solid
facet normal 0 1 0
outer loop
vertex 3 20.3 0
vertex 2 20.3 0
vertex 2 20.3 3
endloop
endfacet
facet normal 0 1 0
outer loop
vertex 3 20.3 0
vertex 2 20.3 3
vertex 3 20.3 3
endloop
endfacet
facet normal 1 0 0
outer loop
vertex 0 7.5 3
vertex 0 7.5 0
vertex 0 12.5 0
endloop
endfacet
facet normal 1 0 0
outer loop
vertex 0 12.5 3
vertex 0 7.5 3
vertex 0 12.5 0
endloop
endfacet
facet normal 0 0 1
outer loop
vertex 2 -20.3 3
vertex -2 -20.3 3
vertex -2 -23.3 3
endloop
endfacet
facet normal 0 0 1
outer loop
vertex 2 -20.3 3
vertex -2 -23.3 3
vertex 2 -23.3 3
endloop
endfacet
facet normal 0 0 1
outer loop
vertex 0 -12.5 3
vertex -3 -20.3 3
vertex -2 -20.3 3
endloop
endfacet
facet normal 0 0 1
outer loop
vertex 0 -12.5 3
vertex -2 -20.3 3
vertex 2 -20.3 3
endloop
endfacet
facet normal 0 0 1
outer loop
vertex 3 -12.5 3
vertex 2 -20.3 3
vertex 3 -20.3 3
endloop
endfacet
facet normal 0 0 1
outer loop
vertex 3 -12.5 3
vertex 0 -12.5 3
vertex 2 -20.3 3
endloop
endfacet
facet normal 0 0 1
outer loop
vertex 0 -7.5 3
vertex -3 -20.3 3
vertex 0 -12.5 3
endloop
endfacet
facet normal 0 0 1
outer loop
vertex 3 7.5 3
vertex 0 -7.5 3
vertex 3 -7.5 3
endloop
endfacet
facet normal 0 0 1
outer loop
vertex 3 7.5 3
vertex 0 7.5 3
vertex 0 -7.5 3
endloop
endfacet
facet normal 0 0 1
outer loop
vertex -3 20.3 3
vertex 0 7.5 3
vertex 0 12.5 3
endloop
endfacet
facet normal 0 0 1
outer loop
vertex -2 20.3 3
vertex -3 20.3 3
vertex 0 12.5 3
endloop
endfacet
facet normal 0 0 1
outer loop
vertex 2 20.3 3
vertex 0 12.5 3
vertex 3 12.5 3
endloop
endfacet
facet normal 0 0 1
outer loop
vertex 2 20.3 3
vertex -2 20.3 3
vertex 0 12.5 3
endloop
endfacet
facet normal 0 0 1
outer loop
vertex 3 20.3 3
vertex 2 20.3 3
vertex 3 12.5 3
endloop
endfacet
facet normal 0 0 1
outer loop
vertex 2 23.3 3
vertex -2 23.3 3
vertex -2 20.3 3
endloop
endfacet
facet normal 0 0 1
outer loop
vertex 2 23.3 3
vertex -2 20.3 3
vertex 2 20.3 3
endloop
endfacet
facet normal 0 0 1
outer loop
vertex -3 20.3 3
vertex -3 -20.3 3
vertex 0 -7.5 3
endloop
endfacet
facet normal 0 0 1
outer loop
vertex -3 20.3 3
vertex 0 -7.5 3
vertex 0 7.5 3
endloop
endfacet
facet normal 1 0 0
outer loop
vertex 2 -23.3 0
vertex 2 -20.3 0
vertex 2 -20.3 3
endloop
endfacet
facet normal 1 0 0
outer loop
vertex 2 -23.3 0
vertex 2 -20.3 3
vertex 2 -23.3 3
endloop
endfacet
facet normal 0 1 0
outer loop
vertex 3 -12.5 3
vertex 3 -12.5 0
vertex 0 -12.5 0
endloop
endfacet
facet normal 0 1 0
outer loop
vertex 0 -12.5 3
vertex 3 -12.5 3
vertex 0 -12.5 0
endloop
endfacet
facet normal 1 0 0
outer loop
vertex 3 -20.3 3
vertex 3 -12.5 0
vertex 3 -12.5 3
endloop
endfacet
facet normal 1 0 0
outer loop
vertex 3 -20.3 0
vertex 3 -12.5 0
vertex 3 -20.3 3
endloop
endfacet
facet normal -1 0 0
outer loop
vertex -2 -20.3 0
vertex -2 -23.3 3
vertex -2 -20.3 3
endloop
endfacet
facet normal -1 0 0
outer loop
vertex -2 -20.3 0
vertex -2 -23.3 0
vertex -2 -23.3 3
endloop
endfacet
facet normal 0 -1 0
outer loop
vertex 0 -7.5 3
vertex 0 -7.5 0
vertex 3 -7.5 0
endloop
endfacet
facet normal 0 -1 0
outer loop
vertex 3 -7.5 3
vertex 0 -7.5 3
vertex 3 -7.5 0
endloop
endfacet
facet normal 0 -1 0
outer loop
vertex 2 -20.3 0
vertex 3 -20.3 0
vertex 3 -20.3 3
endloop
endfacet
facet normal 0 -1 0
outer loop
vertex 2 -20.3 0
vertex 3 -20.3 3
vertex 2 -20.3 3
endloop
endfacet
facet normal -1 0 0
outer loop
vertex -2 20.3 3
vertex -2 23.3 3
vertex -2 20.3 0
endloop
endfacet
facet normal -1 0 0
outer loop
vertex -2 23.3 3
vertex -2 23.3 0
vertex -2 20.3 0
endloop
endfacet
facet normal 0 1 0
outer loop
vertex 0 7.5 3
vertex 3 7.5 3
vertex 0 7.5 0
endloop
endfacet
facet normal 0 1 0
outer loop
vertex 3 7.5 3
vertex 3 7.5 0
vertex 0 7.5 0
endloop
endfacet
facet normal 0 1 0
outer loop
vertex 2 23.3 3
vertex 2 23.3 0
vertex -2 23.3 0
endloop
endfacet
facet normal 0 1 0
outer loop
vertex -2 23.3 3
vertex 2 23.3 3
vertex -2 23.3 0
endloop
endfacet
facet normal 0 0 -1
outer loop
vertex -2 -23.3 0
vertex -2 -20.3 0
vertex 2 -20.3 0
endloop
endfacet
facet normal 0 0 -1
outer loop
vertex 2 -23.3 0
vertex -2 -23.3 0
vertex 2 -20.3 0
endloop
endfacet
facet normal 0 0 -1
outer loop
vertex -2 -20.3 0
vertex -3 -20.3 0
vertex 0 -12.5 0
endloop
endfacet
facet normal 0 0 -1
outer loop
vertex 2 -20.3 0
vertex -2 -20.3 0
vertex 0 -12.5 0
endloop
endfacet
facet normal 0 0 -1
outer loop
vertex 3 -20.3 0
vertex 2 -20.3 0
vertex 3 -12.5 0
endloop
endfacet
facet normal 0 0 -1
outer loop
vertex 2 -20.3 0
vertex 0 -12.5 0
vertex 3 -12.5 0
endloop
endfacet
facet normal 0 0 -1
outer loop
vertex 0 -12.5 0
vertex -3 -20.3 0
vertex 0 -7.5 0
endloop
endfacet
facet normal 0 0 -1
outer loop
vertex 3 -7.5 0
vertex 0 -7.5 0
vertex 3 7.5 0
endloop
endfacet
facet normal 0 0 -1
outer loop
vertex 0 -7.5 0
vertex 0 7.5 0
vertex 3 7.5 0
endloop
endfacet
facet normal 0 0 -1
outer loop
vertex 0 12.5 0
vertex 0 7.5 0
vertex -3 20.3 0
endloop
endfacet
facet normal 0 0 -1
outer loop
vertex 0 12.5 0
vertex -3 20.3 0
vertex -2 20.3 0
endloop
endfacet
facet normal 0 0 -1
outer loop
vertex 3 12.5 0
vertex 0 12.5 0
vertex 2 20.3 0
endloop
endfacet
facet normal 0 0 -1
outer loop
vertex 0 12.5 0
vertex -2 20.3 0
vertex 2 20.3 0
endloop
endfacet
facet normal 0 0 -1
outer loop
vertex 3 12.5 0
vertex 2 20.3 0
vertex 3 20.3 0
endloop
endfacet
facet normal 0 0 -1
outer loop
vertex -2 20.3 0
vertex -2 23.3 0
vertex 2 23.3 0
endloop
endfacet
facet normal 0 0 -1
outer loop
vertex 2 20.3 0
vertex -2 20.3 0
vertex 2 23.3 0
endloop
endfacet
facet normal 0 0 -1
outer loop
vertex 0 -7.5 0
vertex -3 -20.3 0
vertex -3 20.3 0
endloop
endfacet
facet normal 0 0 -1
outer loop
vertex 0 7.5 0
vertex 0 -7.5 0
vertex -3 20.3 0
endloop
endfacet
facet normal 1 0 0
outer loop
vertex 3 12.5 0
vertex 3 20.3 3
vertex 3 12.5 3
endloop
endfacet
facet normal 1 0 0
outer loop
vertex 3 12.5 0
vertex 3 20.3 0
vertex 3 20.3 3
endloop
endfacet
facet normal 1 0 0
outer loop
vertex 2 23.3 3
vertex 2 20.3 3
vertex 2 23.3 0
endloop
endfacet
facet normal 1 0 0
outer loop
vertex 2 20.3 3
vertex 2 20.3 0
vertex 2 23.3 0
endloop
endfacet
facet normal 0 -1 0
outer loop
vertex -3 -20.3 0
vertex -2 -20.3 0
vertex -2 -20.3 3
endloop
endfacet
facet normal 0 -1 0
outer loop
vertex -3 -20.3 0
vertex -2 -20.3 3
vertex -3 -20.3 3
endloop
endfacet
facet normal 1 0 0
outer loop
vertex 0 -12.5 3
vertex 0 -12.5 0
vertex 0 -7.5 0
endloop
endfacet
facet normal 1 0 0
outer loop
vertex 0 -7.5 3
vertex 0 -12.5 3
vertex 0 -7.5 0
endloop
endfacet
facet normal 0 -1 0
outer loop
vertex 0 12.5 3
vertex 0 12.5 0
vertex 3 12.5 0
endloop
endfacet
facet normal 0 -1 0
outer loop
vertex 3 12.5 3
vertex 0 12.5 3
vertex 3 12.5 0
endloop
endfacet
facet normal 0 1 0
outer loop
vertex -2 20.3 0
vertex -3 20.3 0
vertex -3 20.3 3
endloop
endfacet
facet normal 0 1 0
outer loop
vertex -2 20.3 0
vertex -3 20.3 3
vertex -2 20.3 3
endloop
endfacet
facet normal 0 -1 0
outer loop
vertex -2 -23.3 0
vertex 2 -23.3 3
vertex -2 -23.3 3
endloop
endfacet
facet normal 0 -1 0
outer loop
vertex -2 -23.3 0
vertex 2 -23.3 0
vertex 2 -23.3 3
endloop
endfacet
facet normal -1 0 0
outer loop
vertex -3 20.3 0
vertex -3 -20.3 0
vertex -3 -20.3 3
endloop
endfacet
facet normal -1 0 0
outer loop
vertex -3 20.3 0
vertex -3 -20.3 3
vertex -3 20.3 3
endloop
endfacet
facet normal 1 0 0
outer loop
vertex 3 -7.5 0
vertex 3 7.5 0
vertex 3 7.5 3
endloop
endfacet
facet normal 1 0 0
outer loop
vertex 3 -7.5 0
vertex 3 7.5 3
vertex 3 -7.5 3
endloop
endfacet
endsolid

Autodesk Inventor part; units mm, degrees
ref_plane "YZ Plane" through (0, 0, 0) normal (1, 0, 0) x (0, 1, 0)
ref_plane "XZ Plane" through (0, 0, 0) normal (0, 1, 0) x (-1, 0, 0)
ref_plane "XY Plane" through (0, 0, 0) normal (0, 0, 1) x (1, 0, 0)
sketch "Sketch1" plane through (0, 0, 0) normal (0, 0, 1) x (1, 0, 0)
  line L0 (-3, 20.3) -> (3, 20.3)
  line L1 (3, 20.3) -> (3, -20.3)
  line L2 (3, -20.3) -> (-3, -20.3)
  line L3 (-3, -20.3) -> (-3, 20.3)
  line L4 (-2, -20.3) -> (2, -20.3)
  line L5 (2, -20.3) -> (2, -23.3)
  line L6 (2, -23.3) -> (-2, -23.3)
  line L7 (-2, -23.3) -> (-2, -20.3)
  line L8 (-2, 20.3) -> (2, 20.3)
  line L9 (2, 20.3) -> (2, 23.3)
  line L10 (2, 23.3) -> (-2, 23.3)
  line L11 (-2, 23.3) -> (-2, 20.3)
  line L12 (3, -12.5) -> (0, -12.5)
  line L13 (0, -12.5) -> (0, -7.5)
  line L14 (0, -7.5) -> (3, -7.5)
  line L15 (3, -7.5) -> (3, -12.5)
  line L16 (3, 7.5) -> (0, 7.5)
  line L17 (0, 7.5) -> (0, 12.5)
  line L18 (0, 12.5) -> (3, 12.5)
  line L19 (3, 12.5) -> (3, 7.5)
  point P0 (0, 0)
  point P1 (0, 23.3)
  point P2 (0, 20.3)
  point P3 (0, 20.3)
  point P4 (0, -23.3)
  point P5 (3, 0)
  point P6 (3, -10)
  point P7 (3, 10)
  dimension "d0" = 46.6
  dimension "d1" = 3
  dimension "d2" = 4
  dimension "d3" = 6
  dimension "d6" = 5
  dimension "d7" = 10
  dimension "d8" = 10
  dimension "d9" = 3
extrude "Extrusion1" add sketch "Sketch1" along normal blind 3 contours L0 L1 L18 L17 L16 L14 L13 L12 L2 L3 | L11 L10 L9 L0 | L2 L5 L6 L7
properties material "MDF Medium Density Fiberboard"
